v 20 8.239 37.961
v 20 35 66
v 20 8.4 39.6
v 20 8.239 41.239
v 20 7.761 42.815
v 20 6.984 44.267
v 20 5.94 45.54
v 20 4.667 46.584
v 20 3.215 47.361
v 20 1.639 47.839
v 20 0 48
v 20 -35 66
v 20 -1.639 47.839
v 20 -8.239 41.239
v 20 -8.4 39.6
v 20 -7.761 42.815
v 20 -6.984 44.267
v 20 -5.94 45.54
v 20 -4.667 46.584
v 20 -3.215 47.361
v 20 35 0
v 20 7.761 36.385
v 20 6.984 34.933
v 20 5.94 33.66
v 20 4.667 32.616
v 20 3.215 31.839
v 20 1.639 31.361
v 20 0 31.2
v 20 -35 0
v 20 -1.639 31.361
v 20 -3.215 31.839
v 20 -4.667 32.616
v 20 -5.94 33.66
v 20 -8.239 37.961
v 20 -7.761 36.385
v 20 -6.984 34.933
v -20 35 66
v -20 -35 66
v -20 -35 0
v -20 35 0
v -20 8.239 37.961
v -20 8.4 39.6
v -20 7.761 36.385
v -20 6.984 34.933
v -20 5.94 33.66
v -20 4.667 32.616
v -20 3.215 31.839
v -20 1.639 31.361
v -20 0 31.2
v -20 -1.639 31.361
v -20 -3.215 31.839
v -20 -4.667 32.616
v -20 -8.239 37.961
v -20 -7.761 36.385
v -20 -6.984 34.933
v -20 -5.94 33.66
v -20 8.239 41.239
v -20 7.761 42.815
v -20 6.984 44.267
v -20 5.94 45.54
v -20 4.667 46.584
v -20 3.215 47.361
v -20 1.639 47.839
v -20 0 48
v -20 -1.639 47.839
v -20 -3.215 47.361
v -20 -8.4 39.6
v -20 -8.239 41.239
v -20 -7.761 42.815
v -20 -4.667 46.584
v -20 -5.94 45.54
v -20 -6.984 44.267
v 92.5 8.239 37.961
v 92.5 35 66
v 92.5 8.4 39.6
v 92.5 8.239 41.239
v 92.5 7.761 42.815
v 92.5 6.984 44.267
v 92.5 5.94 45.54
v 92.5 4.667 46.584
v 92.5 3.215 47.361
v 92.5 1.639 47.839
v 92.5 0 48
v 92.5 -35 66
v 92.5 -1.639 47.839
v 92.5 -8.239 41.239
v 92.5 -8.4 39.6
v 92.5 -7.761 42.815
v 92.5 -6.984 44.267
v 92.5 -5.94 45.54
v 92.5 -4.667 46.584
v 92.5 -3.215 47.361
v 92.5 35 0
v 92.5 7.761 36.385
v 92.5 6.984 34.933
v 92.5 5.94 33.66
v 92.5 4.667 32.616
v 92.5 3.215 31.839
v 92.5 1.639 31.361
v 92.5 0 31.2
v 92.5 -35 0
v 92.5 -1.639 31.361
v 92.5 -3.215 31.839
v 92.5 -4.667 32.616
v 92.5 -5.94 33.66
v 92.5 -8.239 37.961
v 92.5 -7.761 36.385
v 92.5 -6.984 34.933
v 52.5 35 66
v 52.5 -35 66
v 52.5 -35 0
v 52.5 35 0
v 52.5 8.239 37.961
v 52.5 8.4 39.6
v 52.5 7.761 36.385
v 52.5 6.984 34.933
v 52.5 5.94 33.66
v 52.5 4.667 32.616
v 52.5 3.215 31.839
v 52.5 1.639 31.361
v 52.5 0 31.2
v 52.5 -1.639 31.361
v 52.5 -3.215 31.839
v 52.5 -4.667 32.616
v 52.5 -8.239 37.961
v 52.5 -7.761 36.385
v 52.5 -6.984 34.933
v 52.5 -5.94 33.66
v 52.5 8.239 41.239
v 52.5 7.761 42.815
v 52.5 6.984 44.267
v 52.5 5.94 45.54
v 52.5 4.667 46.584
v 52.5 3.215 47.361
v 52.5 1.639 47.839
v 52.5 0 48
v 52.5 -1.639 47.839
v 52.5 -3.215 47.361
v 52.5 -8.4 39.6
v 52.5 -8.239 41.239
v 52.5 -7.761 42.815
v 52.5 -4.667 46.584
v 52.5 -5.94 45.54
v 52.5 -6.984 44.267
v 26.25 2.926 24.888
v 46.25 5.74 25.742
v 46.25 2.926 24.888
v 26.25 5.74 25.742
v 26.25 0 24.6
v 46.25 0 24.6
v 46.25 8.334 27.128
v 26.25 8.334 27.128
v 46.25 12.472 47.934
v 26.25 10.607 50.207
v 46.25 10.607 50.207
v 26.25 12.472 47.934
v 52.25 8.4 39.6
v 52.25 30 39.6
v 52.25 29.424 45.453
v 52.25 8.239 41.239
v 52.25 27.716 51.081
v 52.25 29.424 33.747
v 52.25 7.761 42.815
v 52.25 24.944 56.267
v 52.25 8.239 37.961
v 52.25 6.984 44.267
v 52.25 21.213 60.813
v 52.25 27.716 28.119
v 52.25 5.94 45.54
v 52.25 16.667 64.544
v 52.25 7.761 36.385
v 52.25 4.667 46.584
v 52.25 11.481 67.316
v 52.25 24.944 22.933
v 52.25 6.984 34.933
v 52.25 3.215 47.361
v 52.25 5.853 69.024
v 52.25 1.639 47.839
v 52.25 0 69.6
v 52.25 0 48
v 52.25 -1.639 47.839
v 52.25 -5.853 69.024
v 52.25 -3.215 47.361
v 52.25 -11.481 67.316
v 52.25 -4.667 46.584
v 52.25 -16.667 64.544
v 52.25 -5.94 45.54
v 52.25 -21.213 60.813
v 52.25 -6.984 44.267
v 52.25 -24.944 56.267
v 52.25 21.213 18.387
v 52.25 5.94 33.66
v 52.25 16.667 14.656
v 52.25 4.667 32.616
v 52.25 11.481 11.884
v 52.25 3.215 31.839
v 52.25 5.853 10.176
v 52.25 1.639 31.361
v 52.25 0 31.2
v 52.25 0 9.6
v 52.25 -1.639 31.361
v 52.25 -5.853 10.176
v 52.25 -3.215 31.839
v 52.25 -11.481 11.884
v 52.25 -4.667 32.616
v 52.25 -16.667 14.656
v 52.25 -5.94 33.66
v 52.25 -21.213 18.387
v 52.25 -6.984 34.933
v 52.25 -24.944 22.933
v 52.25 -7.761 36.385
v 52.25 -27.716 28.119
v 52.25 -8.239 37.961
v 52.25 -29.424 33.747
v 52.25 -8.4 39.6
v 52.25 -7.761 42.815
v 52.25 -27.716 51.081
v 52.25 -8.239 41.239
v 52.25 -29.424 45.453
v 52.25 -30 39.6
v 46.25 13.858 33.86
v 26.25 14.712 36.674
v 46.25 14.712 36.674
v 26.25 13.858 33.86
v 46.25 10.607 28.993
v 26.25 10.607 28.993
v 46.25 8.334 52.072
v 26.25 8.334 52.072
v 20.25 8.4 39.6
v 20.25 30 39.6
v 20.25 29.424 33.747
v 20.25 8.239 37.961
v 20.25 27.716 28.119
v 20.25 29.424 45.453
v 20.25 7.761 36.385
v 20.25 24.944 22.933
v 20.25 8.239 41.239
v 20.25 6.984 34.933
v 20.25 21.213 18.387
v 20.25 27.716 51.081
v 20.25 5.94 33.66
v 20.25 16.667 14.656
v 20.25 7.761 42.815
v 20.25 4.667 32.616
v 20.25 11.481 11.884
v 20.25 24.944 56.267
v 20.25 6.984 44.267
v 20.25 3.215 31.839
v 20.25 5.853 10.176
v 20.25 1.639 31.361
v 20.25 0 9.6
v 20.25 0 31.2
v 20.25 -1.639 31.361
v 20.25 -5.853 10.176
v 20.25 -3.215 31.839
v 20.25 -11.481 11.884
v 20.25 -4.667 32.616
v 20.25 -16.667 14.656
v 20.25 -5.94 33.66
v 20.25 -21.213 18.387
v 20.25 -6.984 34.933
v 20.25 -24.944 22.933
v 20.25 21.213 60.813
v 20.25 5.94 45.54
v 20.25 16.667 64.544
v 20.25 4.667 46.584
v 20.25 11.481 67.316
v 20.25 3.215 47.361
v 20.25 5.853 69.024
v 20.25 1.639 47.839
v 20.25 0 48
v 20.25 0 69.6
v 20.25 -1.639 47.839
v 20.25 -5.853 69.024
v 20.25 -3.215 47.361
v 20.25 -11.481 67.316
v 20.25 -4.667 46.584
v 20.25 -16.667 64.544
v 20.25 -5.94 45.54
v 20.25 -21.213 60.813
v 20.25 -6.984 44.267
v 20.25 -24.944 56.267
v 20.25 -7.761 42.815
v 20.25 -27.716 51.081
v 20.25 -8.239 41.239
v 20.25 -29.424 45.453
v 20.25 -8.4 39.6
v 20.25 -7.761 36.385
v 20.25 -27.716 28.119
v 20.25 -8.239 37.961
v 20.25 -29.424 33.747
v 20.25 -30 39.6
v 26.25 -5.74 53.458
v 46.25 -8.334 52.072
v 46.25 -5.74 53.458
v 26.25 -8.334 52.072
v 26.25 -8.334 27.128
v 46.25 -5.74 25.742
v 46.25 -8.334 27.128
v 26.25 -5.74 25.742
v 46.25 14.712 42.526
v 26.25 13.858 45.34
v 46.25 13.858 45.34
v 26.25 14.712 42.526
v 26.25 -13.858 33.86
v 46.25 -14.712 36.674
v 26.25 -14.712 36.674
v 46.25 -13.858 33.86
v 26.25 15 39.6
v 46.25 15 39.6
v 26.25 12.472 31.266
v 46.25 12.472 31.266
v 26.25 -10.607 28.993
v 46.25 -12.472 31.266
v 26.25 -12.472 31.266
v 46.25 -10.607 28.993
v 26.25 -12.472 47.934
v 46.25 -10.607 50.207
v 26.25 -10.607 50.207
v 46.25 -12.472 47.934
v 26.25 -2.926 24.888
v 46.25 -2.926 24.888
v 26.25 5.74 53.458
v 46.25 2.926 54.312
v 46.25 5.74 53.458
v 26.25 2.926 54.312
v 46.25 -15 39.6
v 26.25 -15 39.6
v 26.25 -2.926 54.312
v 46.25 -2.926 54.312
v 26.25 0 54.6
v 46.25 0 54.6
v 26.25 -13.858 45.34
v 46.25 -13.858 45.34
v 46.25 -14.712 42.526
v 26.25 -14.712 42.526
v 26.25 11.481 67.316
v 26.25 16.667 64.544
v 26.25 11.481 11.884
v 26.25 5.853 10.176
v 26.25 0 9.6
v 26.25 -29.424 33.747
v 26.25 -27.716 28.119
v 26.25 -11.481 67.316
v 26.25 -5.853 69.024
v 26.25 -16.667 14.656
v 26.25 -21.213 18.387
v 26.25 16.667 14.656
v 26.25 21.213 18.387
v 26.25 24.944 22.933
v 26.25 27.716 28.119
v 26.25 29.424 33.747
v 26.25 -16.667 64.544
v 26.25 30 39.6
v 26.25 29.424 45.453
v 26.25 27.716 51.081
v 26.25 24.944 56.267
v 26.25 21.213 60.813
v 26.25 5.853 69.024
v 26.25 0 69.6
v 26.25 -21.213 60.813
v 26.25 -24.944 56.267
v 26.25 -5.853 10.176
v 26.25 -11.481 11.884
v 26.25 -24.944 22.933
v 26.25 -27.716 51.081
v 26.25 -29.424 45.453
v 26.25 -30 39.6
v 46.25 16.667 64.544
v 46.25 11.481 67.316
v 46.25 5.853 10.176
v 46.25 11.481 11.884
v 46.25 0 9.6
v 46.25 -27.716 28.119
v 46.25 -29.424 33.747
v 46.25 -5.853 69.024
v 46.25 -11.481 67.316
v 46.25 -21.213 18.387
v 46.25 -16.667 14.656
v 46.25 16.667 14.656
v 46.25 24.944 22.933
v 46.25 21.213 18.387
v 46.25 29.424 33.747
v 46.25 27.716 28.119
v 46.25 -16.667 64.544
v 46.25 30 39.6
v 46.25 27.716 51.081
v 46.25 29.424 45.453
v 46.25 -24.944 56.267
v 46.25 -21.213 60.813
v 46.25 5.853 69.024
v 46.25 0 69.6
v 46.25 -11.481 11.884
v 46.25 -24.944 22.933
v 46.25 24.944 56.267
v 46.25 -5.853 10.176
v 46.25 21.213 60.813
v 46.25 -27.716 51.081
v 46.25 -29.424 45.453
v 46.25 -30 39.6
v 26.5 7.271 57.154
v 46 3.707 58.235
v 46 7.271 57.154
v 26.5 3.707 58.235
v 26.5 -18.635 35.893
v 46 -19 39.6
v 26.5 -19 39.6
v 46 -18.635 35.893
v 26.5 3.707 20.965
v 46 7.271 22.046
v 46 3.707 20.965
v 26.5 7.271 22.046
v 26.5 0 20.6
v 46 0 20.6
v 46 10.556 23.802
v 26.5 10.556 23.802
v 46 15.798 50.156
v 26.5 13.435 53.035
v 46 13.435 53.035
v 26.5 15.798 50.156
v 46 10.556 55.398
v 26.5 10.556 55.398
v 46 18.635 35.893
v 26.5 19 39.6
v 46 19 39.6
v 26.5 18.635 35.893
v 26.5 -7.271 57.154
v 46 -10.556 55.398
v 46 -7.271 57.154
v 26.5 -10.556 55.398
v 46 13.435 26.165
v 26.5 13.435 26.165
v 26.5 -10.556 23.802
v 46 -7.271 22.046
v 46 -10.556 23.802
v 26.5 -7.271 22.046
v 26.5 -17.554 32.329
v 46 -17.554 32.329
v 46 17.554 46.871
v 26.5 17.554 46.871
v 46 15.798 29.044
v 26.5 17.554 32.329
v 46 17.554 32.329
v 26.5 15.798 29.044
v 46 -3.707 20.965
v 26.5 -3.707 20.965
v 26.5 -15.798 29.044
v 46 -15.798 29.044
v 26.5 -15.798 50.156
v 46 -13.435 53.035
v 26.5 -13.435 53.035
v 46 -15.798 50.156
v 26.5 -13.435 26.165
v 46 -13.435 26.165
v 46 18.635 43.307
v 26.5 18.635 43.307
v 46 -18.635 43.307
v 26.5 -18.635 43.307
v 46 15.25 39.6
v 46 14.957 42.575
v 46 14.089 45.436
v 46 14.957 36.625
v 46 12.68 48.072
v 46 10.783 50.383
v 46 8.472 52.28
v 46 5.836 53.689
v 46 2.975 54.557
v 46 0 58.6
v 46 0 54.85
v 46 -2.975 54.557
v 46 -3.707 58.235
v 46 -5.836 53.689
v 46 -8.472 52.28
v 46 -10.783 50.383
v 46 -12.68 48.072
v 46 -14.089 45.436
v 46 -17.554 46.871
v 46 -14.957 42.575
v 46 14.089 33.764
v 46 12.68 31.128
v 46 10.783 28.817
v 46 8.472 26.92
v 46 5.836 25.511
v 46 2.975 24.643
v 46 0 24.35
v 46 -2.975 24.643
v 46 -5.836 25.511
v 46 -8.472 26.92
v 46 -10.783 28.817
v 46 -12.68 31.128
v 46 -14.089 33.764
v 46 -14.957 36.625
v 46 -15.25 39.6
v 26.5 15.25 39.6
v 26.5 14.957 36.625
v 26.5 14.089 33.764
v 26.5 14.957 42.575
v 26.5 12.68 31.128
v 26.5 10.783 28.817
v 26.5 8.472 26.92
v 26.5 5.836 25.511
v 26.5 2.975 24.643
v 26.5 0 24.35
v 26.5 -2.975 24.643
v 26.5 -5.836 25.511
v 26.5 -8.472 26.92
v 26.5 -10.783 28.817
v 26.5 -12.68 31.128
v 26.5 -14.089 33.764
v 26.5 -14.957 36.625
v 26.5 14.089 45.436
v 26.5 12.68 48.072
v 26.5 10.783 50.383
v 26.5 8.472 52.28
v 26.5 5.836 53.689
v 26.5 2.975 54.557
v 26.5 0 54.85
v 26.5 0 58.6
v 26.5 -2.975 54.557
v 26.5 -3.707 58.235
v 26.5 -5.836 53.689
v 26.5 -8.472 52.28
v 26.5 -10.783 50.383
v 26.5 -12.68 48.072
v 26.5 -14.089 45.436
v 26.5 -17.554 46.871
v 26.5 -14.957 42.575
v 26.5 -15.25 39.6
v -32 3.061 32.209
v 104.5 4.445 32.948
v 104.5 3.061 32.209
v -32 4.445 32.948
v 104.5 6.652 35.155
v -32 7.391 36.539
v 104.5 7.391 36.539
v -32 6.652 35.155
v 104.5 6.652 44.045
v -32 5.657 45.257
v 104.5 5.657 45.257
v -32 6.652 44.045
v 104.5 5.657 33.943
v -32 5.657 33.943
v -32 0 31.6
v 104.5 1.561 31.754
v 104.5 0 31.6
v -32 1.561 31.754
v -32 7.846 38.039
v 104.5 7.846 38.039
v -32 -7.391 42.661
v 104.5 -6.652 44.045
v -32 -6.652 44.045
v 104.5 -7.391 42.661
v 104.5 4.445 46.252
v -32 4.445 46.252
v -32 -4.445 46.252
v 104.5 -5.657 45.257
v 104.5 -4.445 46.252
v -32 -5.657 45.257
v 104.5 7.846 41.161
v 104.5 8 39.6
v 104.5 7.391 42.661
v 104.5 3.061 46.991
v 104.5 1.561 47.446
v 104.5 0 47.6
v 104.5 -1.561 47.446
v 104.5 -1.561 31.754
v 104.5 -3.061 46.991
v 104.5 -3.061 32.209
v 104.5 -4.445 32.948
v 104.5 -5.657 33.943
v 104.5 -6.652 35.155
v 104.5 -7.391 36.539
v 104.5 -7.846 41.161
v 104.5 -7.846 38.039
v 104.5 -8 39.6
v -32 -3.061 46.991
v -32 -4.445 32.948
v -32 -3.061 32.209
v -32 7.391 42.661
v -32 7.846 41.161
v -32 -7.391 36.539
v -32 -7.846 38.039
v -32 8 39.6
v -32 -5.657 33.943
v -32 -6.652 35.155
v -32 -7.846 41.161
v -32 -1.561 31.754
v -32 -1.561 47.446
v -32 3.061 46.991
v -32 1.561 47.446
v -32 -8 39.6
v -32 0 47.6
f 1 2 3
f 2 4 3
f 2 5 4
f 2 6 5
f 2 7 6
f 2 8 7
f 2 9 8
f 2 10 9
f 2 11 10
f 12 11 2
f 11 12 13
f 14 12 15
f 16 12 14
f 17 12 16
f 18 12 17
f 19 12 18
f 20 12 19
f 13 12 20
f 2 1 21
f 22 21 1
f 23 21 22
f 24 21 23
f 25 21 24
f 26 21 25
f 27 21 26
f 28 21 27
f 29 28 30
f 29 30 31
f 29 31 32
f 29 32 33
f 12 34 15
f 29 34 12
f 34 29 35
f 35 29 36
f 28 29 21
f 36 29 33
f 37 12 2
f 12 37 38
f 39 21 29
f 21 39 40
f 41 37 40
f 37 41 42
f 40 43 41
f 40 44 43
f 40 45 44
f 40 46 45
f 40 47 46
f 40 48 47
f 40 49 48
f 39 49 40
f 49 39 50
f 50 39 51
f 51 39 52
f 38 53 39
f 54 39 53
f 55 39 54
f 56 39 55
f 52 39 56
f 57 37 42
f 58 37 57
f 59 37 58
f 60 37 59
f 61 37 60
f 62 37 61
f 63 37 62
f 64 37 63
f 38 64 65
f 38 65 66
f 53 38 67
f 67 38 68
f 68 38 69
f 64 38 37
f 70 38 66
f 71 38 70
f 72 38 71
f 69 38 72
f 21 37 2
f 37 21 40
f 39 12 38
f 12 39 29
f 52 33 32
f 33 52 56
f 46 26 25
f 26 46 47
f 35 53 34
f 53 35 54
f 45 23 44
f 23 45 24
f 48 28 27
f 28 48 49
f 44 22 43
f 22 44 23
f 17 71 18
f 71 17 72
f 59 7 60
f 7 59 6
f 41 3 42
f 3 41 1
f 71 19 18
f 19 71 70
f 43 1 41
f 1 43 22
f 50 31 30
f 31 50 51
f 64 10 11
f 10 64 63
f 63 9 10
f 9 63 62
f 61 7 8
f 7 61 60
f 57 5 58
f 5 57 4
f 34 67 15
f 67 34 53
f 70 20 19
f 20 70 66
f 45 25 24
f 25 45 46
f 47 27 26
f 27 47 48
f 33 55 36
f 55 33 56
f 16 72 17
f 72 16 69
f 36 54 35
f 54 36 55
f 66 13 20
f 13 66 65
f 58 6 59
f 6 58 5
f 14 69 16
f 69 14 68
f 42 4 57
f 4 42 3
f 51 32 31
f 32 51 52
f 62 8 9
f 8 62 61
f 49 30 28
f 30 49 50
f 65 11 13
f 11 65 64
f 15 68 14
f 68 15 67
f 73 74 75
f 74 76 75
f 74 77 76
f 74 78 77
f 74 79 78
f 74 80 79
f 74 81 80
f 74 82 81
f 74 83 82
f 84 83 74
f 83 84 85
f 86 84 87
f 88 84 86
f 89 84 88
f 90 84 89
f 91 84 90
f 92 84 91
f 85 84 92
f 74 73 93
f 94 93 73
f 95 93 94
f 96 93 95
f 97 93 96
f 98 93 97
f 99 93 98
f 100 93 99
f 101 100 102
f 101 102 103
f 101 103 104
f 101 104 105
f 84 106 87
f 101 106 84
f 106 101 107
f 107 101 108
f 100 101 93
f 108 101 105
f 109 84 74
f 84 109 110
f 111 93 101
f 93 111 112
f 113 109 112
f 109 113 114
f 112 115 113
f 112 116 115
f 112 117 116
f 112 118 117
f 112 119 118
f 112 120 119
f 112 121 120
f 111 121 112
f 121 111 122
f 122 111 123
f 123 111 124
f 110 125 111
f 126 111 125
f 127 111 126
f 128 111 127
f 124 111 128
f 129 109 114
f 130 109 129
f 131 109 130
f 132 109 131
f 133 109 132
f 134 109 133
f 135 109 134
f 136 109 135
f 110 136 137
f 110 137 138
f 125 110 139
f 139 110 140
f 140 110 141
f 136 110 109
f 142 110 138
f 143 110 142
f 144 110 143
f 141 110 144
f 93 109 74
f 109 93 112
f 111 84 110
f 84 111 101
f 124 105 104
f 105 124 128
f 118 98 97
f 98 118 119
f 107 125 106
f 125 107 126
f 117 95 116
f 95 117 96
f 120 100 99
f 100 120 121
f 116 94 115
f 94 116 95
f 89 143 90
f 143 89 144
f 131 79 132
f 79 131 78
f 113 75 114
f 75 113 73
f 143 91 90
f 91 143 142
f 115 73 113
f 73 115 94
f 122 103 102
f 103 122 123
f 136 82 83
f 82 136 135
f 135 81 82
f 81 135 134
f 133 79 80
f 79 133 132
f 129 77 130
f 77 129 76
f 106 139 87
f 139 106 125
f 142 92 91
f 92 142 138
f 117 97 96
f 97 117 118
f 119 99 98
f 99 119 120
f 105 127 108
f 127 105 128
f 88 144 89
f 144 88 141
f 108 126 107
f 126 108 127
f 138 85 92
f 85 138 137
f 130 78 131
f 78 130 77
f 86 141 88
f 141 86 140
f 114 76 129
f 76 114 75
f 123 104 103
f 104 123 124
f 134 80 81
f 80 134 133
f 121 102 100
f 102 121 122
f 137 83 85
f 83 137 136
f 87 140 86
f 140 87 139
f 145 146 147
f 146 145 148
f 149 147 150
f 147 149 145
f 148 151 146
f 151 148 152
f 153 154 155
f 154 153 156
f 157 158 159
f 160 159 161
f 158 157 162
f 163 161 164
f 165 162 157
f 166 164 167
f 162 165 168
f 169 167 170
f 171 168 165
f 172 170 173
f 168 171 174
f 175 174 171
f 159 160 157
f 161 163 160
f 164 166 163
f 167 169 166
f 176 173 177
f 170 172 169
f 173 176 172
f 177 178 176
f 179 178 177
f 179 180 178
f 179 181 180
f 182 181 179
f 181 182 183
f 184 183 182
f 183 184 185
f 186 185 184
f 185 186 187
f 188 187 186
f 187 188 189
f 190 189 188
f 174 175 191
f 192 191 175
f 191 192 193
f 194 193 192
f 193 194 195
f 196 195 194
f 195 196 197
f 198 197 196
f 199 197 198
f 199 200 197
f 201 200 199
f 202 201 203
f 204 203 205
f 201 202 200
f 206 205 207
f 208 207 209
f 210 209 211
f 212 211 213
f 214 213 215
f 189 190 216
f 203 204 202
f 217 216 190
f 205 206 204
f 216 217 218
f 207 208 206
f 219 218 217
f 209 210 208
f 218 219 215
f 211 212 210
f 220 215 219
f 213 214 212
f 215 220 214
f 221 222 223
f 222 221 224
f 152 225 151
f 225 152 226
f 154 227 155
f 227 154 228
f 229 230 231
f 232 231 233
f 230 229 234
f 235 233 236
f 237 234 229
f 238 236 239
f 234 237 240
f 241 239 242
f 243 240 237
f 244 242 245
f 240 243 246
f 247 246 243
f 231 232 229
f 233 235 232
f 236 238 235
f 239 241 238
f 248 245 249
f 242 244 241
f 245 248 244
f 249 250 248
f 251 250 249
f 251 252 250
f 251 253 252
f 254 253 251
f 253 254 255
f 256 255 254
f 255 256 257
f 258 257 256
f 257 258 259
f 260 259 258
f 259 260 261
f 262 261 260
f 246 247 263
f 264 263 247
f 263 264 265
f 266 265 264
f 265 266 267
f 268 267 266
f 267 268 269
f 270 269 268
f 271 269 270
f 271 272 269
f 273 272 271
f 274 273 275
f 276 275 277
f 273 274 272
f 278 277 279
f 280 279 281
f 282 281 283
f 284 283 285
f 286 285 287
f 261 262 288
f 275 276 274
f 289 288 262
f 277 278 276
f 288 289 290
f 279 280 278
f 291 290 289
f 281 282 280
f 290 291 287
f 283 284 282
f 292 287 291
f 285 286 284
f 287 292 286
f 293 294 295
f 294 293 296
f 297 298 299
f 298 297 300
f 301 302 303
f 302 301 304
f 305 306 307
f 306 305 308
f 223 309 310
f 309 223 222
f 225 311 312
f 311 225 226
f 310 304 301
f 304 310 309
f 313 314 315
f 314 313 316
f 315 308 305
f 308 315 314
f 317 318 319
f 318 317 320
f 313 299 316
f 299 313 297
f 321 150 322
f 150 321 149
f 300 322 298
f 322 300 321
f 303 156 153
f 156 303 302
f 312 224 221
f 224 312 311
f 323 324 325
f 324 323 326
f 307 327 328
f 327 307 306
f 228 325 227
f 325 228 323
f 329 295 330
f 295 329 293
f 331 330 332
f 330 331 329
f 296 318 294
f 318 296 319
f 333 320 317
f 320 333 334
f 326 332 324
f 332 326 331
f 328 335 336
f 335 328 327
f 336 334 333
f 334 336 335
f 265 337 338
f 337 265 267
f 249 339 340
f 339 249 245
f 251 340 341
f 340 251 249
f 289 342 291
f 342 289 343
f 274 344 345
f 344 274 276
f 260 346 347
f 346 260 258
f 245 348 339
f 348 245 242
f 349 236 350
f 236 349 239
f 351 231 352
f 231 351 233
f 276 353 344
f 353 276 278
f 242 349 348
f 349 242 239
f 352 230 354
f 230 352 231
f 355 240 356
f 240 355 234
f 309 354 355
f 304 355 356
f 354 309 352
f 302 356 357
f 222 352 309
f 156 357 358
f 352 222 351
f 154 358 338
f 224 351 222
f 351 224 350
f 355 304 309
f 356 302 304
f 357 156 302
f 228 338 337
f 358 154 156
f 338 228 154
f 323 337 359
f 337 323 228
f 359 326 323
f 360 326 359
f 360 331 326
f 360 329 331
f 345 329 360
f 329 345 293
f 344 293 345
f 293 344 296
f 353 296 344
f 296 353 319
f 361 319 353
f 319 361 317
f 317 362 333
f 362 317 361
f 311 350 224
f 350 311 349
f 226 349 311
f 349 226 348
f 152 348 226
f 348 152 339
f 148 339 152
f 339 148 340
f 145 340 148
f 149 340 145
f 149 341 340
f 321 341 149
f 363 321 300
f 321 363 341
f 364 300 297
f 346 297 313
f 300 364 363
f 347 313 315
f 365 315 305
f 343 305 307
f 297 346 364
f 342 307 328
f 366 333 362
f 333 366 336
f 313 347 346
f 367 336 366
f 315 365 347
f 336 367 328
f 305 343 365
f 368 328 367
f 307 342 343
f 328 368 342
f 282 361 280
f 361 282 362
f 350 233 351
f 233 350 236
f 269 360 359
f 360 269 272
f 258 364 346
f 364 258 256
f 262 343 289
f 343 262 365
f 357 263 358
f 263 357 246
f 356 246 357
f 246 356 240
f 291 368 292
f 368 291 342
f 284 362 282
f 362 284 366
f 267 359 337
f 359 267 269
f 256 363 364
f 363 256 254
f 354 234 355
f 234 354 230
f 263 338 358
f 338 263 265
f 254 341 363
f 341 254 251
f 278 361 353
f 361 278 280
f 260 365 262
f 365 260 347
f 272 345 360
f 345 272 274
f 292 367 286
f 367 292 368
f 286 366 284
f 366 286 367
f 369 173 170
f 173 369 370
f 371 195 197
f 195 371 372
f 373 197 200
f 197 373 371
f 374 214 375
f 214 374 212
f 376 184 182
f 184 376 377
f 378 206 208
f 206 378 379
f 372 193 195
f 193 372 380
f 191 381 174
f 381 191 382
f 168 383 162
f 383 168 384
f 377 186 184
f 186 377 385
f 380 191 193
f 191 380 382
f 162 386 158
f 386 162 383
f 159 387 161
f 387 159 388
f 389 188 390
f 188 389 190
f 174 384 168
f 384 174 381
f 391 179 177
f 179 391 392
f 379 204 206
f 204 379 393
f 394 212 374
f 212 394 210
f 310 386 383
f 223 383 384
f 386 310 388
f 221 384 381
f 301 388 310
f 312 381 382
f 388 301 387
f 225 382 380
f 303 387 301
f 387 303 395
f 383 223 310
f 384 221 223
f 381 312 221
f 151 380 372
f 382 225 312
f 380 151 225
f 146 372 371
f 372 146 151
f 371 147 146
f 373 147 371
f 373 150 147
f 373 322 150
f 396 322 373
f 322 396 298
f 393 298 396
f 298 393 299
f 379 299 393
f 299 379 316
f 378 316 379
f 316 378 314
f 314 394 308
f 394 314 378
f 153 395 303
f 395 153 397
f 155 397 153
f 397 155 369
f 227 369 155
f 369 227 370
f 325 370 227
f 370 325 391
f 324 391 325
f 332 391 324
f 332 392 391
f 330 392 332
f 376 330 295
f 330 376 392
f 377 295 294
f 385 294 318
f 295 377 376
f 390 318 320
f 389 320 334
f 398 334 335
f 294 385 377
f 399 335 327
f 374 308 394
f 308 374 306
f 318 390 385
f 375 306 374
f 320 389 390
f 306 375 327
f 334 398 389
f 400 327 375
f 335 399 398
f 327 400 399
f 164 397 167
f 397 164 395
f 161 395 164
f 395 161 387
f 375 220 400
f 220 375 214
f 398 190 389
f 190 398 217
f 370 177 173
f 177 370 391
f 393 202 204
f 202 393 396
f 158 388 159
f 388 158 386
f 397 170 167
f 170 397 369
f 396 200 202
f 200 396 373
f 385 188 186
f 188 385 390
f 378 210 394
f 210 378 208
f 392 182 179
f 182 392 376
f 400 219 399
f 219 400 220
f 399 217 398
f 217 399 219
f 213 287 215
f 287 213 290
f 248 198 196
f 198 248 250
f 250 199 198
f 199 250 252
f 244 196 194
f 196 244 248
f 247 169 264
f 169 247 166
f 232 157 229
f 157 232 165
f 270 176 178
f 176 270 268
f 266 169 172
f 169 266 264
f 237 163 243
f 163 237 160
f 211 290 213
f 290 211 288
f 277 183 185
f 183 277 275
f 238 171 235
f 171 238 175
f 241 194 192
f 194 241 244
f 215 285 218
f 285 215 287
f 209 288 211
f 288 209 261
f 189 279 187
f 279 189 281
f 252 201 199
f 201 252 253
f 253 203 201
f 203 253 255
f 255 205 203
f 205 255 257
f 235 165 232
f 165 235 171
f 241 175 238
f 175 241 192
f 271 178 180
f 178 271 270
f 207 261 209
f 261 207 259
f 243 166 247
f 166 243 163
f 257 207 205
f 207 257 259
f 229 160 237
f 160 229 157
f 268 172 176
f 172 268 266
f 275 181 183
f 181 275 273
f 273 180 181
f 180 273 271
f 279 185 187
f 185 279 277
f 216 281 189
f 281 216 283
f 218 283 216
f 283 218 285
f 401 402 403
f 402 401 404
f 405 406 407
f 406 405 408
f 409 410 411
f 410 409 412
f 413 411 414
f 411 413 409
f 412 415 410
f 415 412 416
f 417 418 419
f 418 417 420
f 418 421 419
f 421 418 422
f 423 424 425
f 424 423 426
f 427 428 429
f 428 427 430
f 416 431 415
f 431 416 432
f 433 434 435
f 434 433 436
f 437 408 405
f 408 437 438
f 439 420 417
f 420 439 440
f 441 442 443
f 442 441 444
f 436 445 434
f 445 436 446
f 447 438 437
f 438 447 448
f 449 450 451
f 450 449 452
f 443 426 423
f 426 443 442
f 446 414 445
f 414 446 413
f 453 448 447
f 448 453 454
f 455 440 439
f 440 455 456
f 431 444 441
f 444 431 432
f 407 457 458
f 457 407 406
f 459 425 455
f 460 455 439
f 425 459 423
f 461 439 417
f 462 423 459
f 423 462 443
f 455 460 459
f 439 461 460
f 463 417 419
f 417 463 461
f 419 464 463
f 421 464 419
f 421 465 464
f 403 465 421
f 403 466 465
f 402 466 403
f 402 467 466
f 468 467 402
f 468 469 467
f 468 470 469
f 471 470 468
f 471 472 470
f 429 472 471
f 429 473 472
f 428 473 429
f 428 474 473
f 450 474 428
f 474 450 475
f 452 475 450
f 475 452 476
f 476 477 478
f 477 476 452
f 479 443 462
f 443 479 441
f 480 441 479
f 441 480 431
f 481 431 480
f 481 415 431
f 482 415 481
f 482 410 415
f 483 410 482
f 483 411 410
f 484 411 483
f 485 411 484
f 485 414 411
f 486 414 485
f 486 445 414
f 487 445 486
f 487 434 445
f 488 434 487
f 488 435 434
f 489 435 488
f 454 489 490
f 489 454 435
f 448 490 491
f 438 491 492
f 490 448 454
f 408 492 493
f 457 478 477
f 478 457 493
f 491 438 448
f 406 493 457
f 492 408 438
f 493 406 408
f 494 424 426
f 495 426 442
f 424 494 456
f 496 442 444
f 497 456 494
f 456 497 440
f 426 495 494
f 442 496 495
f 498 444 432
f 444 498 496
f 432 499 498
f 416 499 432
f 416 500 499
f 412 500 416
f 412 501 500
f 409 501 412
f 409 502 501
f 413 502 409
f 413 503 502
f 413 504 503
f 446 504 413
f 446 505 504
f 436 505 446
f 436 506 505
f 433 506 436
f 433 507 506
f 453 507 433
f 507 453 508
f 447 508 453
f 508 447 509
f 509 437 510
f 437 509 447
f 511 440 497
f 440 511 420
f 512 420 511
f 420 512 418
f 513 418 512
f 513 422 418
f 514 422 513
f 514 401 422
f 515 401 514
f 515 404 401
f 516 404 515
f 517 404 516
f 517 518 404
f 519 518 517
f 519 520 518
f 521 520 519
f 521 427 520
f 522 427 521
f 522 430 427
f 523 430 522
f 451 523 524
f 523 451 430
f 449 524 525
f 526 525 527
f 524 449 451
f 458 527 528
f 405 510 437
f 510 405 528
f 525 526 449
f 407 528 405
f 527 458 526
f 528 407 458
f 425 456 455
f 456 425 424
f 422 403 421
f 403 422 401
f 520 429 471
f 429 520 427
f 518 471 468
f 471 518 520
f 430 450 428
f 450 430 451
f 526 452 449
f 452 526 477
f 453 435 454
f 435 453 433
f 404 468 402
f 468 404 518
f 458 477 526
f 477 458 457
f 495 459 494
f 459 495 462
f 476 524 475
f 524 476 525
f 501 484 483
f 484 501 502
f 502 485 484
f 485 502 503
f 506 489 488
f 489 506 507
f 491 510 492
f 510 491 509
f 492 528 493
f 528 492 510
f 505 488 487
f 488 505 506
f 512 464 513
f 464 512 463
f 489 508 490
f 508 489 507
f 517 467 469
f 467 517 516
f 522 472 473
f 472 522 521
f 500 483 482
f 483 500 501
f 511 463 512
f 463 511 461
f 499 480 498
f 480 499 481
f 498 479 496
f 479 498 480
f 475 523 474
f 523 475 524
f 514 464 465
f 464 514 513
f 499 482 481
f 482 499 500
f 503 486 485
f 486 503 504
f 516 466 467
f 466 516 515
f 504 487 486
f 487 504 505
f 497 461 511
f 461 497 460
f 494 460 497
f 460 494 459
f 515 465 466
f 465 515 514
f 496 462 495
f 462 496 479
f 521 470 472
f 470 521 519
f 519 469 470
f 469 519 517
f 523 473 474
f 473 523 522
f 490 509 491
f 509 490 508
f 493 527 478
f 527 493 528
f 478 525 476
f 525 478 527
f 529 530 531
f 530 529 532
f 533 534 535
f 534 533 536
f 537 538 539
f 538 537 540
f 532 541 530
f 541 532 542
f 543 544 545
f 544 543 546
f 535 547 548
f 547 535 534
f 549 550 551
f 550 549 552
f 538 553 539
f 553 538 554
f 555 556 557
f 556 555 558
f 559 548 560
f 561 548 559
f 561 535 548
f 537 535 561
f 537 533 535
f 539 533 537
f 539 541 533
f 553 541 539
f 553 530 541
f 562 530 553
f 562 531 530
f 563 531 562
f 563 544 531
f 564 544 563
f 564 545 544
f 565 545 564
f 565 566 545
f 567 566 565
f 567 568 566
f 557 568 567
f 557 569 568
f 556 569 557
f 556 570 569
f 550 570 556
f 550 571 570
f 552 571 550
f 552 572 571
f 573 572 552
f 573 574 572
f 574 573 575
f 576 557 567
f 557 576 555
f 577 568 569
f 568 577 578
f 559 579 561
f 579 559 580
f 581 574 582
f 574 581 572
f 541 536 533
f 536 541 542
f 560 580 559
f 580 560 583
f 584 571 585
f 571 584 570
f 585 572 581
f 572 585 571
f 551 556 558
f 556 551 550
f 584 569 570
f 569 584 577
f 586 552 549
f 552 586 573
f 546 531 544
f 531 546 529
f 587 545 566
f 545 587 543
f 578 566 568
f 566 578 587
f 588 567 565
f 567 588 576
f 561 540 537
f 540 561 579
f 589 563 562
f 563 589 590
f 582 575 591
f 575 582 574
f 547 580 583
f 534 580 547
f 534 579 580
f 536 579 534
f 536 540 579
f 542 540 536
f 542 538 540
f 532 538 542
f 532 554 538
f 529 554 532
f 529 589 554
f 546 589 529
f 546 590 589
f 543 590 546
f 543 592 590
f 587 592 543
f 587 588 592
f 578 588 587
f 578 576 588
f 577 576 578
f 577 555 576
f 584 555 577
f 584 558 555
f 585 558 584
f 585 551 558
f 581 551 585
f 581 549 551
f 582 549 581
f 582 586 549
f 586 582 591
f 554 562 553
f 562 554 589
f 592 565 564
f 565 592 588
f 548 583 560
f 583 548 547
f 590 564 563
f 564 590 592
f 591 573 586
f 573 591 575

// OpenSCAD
$fn = 32;

// ------------------------------------------------------------------------
// Pulley assembly: d60 pulley with a belt, shaft d16
// Every part is its own module, assembly() places them once.
// ------------------------------------------------------------------------

// --- part 1 ---
module support1() {
  difference() {
    translate([-20, -35, 0]) cube([40, 70, 66]);
    translate([0, 0, 39.6]) rotate([0, 90, 0]) cylinder(h = 42, d = 16.8, center = true);
  }
}

// --- part 2 ---
module support2() {
  difference() {
    translate([-20, -35, 0]) cube([40, 70, 66]);
    translate([0, 0, 39.6]) rotate([0, 90, 0]) cylinder(h = 42, d = 16.8, center = true);
  }
}

// --- part 3 ---
module shaft() {
  translate([0, 0, -68.25]) cylinder(h = 136.5, d = 16);
}

// --- part 4 ---
module pulley() {
  difference() {
    union() {
      cylinder(h = 32, d = 30);
      cylinder(h = 6, d = 60);
      translate([0, 0, 26]) cylinder(h = 6, d = 60);
    }
    translate([0, 0, -1]) cylinder(h = 34, d = 16.8);
  }
}

// --- part 5 ---
module belt() {
  difference() {
      translate([0, 0, 0]) cylinder(h = 19.5, d = 38);
      translate([0, 0, -1]) cylinder(h = 21.5, d = 30.5);
    }
}

// --- assembly ---
module assembly() {
  translate([0, 0, 0]) rotate([0, 0, 0]) support1();
  translate([72.5, 0, 0]) rotate([0, 0, 0]) support2();
  translate([36.25, 0, 39.6]) rotate([0, 90, 0]) shaft();
  translate([20.25, 0, 39.6]) rotate([0, 90, 0]) pulley();
  translate([26.5, 0, 39.6]) rotate([0, 90, 0]) belt();
}

assembly();
